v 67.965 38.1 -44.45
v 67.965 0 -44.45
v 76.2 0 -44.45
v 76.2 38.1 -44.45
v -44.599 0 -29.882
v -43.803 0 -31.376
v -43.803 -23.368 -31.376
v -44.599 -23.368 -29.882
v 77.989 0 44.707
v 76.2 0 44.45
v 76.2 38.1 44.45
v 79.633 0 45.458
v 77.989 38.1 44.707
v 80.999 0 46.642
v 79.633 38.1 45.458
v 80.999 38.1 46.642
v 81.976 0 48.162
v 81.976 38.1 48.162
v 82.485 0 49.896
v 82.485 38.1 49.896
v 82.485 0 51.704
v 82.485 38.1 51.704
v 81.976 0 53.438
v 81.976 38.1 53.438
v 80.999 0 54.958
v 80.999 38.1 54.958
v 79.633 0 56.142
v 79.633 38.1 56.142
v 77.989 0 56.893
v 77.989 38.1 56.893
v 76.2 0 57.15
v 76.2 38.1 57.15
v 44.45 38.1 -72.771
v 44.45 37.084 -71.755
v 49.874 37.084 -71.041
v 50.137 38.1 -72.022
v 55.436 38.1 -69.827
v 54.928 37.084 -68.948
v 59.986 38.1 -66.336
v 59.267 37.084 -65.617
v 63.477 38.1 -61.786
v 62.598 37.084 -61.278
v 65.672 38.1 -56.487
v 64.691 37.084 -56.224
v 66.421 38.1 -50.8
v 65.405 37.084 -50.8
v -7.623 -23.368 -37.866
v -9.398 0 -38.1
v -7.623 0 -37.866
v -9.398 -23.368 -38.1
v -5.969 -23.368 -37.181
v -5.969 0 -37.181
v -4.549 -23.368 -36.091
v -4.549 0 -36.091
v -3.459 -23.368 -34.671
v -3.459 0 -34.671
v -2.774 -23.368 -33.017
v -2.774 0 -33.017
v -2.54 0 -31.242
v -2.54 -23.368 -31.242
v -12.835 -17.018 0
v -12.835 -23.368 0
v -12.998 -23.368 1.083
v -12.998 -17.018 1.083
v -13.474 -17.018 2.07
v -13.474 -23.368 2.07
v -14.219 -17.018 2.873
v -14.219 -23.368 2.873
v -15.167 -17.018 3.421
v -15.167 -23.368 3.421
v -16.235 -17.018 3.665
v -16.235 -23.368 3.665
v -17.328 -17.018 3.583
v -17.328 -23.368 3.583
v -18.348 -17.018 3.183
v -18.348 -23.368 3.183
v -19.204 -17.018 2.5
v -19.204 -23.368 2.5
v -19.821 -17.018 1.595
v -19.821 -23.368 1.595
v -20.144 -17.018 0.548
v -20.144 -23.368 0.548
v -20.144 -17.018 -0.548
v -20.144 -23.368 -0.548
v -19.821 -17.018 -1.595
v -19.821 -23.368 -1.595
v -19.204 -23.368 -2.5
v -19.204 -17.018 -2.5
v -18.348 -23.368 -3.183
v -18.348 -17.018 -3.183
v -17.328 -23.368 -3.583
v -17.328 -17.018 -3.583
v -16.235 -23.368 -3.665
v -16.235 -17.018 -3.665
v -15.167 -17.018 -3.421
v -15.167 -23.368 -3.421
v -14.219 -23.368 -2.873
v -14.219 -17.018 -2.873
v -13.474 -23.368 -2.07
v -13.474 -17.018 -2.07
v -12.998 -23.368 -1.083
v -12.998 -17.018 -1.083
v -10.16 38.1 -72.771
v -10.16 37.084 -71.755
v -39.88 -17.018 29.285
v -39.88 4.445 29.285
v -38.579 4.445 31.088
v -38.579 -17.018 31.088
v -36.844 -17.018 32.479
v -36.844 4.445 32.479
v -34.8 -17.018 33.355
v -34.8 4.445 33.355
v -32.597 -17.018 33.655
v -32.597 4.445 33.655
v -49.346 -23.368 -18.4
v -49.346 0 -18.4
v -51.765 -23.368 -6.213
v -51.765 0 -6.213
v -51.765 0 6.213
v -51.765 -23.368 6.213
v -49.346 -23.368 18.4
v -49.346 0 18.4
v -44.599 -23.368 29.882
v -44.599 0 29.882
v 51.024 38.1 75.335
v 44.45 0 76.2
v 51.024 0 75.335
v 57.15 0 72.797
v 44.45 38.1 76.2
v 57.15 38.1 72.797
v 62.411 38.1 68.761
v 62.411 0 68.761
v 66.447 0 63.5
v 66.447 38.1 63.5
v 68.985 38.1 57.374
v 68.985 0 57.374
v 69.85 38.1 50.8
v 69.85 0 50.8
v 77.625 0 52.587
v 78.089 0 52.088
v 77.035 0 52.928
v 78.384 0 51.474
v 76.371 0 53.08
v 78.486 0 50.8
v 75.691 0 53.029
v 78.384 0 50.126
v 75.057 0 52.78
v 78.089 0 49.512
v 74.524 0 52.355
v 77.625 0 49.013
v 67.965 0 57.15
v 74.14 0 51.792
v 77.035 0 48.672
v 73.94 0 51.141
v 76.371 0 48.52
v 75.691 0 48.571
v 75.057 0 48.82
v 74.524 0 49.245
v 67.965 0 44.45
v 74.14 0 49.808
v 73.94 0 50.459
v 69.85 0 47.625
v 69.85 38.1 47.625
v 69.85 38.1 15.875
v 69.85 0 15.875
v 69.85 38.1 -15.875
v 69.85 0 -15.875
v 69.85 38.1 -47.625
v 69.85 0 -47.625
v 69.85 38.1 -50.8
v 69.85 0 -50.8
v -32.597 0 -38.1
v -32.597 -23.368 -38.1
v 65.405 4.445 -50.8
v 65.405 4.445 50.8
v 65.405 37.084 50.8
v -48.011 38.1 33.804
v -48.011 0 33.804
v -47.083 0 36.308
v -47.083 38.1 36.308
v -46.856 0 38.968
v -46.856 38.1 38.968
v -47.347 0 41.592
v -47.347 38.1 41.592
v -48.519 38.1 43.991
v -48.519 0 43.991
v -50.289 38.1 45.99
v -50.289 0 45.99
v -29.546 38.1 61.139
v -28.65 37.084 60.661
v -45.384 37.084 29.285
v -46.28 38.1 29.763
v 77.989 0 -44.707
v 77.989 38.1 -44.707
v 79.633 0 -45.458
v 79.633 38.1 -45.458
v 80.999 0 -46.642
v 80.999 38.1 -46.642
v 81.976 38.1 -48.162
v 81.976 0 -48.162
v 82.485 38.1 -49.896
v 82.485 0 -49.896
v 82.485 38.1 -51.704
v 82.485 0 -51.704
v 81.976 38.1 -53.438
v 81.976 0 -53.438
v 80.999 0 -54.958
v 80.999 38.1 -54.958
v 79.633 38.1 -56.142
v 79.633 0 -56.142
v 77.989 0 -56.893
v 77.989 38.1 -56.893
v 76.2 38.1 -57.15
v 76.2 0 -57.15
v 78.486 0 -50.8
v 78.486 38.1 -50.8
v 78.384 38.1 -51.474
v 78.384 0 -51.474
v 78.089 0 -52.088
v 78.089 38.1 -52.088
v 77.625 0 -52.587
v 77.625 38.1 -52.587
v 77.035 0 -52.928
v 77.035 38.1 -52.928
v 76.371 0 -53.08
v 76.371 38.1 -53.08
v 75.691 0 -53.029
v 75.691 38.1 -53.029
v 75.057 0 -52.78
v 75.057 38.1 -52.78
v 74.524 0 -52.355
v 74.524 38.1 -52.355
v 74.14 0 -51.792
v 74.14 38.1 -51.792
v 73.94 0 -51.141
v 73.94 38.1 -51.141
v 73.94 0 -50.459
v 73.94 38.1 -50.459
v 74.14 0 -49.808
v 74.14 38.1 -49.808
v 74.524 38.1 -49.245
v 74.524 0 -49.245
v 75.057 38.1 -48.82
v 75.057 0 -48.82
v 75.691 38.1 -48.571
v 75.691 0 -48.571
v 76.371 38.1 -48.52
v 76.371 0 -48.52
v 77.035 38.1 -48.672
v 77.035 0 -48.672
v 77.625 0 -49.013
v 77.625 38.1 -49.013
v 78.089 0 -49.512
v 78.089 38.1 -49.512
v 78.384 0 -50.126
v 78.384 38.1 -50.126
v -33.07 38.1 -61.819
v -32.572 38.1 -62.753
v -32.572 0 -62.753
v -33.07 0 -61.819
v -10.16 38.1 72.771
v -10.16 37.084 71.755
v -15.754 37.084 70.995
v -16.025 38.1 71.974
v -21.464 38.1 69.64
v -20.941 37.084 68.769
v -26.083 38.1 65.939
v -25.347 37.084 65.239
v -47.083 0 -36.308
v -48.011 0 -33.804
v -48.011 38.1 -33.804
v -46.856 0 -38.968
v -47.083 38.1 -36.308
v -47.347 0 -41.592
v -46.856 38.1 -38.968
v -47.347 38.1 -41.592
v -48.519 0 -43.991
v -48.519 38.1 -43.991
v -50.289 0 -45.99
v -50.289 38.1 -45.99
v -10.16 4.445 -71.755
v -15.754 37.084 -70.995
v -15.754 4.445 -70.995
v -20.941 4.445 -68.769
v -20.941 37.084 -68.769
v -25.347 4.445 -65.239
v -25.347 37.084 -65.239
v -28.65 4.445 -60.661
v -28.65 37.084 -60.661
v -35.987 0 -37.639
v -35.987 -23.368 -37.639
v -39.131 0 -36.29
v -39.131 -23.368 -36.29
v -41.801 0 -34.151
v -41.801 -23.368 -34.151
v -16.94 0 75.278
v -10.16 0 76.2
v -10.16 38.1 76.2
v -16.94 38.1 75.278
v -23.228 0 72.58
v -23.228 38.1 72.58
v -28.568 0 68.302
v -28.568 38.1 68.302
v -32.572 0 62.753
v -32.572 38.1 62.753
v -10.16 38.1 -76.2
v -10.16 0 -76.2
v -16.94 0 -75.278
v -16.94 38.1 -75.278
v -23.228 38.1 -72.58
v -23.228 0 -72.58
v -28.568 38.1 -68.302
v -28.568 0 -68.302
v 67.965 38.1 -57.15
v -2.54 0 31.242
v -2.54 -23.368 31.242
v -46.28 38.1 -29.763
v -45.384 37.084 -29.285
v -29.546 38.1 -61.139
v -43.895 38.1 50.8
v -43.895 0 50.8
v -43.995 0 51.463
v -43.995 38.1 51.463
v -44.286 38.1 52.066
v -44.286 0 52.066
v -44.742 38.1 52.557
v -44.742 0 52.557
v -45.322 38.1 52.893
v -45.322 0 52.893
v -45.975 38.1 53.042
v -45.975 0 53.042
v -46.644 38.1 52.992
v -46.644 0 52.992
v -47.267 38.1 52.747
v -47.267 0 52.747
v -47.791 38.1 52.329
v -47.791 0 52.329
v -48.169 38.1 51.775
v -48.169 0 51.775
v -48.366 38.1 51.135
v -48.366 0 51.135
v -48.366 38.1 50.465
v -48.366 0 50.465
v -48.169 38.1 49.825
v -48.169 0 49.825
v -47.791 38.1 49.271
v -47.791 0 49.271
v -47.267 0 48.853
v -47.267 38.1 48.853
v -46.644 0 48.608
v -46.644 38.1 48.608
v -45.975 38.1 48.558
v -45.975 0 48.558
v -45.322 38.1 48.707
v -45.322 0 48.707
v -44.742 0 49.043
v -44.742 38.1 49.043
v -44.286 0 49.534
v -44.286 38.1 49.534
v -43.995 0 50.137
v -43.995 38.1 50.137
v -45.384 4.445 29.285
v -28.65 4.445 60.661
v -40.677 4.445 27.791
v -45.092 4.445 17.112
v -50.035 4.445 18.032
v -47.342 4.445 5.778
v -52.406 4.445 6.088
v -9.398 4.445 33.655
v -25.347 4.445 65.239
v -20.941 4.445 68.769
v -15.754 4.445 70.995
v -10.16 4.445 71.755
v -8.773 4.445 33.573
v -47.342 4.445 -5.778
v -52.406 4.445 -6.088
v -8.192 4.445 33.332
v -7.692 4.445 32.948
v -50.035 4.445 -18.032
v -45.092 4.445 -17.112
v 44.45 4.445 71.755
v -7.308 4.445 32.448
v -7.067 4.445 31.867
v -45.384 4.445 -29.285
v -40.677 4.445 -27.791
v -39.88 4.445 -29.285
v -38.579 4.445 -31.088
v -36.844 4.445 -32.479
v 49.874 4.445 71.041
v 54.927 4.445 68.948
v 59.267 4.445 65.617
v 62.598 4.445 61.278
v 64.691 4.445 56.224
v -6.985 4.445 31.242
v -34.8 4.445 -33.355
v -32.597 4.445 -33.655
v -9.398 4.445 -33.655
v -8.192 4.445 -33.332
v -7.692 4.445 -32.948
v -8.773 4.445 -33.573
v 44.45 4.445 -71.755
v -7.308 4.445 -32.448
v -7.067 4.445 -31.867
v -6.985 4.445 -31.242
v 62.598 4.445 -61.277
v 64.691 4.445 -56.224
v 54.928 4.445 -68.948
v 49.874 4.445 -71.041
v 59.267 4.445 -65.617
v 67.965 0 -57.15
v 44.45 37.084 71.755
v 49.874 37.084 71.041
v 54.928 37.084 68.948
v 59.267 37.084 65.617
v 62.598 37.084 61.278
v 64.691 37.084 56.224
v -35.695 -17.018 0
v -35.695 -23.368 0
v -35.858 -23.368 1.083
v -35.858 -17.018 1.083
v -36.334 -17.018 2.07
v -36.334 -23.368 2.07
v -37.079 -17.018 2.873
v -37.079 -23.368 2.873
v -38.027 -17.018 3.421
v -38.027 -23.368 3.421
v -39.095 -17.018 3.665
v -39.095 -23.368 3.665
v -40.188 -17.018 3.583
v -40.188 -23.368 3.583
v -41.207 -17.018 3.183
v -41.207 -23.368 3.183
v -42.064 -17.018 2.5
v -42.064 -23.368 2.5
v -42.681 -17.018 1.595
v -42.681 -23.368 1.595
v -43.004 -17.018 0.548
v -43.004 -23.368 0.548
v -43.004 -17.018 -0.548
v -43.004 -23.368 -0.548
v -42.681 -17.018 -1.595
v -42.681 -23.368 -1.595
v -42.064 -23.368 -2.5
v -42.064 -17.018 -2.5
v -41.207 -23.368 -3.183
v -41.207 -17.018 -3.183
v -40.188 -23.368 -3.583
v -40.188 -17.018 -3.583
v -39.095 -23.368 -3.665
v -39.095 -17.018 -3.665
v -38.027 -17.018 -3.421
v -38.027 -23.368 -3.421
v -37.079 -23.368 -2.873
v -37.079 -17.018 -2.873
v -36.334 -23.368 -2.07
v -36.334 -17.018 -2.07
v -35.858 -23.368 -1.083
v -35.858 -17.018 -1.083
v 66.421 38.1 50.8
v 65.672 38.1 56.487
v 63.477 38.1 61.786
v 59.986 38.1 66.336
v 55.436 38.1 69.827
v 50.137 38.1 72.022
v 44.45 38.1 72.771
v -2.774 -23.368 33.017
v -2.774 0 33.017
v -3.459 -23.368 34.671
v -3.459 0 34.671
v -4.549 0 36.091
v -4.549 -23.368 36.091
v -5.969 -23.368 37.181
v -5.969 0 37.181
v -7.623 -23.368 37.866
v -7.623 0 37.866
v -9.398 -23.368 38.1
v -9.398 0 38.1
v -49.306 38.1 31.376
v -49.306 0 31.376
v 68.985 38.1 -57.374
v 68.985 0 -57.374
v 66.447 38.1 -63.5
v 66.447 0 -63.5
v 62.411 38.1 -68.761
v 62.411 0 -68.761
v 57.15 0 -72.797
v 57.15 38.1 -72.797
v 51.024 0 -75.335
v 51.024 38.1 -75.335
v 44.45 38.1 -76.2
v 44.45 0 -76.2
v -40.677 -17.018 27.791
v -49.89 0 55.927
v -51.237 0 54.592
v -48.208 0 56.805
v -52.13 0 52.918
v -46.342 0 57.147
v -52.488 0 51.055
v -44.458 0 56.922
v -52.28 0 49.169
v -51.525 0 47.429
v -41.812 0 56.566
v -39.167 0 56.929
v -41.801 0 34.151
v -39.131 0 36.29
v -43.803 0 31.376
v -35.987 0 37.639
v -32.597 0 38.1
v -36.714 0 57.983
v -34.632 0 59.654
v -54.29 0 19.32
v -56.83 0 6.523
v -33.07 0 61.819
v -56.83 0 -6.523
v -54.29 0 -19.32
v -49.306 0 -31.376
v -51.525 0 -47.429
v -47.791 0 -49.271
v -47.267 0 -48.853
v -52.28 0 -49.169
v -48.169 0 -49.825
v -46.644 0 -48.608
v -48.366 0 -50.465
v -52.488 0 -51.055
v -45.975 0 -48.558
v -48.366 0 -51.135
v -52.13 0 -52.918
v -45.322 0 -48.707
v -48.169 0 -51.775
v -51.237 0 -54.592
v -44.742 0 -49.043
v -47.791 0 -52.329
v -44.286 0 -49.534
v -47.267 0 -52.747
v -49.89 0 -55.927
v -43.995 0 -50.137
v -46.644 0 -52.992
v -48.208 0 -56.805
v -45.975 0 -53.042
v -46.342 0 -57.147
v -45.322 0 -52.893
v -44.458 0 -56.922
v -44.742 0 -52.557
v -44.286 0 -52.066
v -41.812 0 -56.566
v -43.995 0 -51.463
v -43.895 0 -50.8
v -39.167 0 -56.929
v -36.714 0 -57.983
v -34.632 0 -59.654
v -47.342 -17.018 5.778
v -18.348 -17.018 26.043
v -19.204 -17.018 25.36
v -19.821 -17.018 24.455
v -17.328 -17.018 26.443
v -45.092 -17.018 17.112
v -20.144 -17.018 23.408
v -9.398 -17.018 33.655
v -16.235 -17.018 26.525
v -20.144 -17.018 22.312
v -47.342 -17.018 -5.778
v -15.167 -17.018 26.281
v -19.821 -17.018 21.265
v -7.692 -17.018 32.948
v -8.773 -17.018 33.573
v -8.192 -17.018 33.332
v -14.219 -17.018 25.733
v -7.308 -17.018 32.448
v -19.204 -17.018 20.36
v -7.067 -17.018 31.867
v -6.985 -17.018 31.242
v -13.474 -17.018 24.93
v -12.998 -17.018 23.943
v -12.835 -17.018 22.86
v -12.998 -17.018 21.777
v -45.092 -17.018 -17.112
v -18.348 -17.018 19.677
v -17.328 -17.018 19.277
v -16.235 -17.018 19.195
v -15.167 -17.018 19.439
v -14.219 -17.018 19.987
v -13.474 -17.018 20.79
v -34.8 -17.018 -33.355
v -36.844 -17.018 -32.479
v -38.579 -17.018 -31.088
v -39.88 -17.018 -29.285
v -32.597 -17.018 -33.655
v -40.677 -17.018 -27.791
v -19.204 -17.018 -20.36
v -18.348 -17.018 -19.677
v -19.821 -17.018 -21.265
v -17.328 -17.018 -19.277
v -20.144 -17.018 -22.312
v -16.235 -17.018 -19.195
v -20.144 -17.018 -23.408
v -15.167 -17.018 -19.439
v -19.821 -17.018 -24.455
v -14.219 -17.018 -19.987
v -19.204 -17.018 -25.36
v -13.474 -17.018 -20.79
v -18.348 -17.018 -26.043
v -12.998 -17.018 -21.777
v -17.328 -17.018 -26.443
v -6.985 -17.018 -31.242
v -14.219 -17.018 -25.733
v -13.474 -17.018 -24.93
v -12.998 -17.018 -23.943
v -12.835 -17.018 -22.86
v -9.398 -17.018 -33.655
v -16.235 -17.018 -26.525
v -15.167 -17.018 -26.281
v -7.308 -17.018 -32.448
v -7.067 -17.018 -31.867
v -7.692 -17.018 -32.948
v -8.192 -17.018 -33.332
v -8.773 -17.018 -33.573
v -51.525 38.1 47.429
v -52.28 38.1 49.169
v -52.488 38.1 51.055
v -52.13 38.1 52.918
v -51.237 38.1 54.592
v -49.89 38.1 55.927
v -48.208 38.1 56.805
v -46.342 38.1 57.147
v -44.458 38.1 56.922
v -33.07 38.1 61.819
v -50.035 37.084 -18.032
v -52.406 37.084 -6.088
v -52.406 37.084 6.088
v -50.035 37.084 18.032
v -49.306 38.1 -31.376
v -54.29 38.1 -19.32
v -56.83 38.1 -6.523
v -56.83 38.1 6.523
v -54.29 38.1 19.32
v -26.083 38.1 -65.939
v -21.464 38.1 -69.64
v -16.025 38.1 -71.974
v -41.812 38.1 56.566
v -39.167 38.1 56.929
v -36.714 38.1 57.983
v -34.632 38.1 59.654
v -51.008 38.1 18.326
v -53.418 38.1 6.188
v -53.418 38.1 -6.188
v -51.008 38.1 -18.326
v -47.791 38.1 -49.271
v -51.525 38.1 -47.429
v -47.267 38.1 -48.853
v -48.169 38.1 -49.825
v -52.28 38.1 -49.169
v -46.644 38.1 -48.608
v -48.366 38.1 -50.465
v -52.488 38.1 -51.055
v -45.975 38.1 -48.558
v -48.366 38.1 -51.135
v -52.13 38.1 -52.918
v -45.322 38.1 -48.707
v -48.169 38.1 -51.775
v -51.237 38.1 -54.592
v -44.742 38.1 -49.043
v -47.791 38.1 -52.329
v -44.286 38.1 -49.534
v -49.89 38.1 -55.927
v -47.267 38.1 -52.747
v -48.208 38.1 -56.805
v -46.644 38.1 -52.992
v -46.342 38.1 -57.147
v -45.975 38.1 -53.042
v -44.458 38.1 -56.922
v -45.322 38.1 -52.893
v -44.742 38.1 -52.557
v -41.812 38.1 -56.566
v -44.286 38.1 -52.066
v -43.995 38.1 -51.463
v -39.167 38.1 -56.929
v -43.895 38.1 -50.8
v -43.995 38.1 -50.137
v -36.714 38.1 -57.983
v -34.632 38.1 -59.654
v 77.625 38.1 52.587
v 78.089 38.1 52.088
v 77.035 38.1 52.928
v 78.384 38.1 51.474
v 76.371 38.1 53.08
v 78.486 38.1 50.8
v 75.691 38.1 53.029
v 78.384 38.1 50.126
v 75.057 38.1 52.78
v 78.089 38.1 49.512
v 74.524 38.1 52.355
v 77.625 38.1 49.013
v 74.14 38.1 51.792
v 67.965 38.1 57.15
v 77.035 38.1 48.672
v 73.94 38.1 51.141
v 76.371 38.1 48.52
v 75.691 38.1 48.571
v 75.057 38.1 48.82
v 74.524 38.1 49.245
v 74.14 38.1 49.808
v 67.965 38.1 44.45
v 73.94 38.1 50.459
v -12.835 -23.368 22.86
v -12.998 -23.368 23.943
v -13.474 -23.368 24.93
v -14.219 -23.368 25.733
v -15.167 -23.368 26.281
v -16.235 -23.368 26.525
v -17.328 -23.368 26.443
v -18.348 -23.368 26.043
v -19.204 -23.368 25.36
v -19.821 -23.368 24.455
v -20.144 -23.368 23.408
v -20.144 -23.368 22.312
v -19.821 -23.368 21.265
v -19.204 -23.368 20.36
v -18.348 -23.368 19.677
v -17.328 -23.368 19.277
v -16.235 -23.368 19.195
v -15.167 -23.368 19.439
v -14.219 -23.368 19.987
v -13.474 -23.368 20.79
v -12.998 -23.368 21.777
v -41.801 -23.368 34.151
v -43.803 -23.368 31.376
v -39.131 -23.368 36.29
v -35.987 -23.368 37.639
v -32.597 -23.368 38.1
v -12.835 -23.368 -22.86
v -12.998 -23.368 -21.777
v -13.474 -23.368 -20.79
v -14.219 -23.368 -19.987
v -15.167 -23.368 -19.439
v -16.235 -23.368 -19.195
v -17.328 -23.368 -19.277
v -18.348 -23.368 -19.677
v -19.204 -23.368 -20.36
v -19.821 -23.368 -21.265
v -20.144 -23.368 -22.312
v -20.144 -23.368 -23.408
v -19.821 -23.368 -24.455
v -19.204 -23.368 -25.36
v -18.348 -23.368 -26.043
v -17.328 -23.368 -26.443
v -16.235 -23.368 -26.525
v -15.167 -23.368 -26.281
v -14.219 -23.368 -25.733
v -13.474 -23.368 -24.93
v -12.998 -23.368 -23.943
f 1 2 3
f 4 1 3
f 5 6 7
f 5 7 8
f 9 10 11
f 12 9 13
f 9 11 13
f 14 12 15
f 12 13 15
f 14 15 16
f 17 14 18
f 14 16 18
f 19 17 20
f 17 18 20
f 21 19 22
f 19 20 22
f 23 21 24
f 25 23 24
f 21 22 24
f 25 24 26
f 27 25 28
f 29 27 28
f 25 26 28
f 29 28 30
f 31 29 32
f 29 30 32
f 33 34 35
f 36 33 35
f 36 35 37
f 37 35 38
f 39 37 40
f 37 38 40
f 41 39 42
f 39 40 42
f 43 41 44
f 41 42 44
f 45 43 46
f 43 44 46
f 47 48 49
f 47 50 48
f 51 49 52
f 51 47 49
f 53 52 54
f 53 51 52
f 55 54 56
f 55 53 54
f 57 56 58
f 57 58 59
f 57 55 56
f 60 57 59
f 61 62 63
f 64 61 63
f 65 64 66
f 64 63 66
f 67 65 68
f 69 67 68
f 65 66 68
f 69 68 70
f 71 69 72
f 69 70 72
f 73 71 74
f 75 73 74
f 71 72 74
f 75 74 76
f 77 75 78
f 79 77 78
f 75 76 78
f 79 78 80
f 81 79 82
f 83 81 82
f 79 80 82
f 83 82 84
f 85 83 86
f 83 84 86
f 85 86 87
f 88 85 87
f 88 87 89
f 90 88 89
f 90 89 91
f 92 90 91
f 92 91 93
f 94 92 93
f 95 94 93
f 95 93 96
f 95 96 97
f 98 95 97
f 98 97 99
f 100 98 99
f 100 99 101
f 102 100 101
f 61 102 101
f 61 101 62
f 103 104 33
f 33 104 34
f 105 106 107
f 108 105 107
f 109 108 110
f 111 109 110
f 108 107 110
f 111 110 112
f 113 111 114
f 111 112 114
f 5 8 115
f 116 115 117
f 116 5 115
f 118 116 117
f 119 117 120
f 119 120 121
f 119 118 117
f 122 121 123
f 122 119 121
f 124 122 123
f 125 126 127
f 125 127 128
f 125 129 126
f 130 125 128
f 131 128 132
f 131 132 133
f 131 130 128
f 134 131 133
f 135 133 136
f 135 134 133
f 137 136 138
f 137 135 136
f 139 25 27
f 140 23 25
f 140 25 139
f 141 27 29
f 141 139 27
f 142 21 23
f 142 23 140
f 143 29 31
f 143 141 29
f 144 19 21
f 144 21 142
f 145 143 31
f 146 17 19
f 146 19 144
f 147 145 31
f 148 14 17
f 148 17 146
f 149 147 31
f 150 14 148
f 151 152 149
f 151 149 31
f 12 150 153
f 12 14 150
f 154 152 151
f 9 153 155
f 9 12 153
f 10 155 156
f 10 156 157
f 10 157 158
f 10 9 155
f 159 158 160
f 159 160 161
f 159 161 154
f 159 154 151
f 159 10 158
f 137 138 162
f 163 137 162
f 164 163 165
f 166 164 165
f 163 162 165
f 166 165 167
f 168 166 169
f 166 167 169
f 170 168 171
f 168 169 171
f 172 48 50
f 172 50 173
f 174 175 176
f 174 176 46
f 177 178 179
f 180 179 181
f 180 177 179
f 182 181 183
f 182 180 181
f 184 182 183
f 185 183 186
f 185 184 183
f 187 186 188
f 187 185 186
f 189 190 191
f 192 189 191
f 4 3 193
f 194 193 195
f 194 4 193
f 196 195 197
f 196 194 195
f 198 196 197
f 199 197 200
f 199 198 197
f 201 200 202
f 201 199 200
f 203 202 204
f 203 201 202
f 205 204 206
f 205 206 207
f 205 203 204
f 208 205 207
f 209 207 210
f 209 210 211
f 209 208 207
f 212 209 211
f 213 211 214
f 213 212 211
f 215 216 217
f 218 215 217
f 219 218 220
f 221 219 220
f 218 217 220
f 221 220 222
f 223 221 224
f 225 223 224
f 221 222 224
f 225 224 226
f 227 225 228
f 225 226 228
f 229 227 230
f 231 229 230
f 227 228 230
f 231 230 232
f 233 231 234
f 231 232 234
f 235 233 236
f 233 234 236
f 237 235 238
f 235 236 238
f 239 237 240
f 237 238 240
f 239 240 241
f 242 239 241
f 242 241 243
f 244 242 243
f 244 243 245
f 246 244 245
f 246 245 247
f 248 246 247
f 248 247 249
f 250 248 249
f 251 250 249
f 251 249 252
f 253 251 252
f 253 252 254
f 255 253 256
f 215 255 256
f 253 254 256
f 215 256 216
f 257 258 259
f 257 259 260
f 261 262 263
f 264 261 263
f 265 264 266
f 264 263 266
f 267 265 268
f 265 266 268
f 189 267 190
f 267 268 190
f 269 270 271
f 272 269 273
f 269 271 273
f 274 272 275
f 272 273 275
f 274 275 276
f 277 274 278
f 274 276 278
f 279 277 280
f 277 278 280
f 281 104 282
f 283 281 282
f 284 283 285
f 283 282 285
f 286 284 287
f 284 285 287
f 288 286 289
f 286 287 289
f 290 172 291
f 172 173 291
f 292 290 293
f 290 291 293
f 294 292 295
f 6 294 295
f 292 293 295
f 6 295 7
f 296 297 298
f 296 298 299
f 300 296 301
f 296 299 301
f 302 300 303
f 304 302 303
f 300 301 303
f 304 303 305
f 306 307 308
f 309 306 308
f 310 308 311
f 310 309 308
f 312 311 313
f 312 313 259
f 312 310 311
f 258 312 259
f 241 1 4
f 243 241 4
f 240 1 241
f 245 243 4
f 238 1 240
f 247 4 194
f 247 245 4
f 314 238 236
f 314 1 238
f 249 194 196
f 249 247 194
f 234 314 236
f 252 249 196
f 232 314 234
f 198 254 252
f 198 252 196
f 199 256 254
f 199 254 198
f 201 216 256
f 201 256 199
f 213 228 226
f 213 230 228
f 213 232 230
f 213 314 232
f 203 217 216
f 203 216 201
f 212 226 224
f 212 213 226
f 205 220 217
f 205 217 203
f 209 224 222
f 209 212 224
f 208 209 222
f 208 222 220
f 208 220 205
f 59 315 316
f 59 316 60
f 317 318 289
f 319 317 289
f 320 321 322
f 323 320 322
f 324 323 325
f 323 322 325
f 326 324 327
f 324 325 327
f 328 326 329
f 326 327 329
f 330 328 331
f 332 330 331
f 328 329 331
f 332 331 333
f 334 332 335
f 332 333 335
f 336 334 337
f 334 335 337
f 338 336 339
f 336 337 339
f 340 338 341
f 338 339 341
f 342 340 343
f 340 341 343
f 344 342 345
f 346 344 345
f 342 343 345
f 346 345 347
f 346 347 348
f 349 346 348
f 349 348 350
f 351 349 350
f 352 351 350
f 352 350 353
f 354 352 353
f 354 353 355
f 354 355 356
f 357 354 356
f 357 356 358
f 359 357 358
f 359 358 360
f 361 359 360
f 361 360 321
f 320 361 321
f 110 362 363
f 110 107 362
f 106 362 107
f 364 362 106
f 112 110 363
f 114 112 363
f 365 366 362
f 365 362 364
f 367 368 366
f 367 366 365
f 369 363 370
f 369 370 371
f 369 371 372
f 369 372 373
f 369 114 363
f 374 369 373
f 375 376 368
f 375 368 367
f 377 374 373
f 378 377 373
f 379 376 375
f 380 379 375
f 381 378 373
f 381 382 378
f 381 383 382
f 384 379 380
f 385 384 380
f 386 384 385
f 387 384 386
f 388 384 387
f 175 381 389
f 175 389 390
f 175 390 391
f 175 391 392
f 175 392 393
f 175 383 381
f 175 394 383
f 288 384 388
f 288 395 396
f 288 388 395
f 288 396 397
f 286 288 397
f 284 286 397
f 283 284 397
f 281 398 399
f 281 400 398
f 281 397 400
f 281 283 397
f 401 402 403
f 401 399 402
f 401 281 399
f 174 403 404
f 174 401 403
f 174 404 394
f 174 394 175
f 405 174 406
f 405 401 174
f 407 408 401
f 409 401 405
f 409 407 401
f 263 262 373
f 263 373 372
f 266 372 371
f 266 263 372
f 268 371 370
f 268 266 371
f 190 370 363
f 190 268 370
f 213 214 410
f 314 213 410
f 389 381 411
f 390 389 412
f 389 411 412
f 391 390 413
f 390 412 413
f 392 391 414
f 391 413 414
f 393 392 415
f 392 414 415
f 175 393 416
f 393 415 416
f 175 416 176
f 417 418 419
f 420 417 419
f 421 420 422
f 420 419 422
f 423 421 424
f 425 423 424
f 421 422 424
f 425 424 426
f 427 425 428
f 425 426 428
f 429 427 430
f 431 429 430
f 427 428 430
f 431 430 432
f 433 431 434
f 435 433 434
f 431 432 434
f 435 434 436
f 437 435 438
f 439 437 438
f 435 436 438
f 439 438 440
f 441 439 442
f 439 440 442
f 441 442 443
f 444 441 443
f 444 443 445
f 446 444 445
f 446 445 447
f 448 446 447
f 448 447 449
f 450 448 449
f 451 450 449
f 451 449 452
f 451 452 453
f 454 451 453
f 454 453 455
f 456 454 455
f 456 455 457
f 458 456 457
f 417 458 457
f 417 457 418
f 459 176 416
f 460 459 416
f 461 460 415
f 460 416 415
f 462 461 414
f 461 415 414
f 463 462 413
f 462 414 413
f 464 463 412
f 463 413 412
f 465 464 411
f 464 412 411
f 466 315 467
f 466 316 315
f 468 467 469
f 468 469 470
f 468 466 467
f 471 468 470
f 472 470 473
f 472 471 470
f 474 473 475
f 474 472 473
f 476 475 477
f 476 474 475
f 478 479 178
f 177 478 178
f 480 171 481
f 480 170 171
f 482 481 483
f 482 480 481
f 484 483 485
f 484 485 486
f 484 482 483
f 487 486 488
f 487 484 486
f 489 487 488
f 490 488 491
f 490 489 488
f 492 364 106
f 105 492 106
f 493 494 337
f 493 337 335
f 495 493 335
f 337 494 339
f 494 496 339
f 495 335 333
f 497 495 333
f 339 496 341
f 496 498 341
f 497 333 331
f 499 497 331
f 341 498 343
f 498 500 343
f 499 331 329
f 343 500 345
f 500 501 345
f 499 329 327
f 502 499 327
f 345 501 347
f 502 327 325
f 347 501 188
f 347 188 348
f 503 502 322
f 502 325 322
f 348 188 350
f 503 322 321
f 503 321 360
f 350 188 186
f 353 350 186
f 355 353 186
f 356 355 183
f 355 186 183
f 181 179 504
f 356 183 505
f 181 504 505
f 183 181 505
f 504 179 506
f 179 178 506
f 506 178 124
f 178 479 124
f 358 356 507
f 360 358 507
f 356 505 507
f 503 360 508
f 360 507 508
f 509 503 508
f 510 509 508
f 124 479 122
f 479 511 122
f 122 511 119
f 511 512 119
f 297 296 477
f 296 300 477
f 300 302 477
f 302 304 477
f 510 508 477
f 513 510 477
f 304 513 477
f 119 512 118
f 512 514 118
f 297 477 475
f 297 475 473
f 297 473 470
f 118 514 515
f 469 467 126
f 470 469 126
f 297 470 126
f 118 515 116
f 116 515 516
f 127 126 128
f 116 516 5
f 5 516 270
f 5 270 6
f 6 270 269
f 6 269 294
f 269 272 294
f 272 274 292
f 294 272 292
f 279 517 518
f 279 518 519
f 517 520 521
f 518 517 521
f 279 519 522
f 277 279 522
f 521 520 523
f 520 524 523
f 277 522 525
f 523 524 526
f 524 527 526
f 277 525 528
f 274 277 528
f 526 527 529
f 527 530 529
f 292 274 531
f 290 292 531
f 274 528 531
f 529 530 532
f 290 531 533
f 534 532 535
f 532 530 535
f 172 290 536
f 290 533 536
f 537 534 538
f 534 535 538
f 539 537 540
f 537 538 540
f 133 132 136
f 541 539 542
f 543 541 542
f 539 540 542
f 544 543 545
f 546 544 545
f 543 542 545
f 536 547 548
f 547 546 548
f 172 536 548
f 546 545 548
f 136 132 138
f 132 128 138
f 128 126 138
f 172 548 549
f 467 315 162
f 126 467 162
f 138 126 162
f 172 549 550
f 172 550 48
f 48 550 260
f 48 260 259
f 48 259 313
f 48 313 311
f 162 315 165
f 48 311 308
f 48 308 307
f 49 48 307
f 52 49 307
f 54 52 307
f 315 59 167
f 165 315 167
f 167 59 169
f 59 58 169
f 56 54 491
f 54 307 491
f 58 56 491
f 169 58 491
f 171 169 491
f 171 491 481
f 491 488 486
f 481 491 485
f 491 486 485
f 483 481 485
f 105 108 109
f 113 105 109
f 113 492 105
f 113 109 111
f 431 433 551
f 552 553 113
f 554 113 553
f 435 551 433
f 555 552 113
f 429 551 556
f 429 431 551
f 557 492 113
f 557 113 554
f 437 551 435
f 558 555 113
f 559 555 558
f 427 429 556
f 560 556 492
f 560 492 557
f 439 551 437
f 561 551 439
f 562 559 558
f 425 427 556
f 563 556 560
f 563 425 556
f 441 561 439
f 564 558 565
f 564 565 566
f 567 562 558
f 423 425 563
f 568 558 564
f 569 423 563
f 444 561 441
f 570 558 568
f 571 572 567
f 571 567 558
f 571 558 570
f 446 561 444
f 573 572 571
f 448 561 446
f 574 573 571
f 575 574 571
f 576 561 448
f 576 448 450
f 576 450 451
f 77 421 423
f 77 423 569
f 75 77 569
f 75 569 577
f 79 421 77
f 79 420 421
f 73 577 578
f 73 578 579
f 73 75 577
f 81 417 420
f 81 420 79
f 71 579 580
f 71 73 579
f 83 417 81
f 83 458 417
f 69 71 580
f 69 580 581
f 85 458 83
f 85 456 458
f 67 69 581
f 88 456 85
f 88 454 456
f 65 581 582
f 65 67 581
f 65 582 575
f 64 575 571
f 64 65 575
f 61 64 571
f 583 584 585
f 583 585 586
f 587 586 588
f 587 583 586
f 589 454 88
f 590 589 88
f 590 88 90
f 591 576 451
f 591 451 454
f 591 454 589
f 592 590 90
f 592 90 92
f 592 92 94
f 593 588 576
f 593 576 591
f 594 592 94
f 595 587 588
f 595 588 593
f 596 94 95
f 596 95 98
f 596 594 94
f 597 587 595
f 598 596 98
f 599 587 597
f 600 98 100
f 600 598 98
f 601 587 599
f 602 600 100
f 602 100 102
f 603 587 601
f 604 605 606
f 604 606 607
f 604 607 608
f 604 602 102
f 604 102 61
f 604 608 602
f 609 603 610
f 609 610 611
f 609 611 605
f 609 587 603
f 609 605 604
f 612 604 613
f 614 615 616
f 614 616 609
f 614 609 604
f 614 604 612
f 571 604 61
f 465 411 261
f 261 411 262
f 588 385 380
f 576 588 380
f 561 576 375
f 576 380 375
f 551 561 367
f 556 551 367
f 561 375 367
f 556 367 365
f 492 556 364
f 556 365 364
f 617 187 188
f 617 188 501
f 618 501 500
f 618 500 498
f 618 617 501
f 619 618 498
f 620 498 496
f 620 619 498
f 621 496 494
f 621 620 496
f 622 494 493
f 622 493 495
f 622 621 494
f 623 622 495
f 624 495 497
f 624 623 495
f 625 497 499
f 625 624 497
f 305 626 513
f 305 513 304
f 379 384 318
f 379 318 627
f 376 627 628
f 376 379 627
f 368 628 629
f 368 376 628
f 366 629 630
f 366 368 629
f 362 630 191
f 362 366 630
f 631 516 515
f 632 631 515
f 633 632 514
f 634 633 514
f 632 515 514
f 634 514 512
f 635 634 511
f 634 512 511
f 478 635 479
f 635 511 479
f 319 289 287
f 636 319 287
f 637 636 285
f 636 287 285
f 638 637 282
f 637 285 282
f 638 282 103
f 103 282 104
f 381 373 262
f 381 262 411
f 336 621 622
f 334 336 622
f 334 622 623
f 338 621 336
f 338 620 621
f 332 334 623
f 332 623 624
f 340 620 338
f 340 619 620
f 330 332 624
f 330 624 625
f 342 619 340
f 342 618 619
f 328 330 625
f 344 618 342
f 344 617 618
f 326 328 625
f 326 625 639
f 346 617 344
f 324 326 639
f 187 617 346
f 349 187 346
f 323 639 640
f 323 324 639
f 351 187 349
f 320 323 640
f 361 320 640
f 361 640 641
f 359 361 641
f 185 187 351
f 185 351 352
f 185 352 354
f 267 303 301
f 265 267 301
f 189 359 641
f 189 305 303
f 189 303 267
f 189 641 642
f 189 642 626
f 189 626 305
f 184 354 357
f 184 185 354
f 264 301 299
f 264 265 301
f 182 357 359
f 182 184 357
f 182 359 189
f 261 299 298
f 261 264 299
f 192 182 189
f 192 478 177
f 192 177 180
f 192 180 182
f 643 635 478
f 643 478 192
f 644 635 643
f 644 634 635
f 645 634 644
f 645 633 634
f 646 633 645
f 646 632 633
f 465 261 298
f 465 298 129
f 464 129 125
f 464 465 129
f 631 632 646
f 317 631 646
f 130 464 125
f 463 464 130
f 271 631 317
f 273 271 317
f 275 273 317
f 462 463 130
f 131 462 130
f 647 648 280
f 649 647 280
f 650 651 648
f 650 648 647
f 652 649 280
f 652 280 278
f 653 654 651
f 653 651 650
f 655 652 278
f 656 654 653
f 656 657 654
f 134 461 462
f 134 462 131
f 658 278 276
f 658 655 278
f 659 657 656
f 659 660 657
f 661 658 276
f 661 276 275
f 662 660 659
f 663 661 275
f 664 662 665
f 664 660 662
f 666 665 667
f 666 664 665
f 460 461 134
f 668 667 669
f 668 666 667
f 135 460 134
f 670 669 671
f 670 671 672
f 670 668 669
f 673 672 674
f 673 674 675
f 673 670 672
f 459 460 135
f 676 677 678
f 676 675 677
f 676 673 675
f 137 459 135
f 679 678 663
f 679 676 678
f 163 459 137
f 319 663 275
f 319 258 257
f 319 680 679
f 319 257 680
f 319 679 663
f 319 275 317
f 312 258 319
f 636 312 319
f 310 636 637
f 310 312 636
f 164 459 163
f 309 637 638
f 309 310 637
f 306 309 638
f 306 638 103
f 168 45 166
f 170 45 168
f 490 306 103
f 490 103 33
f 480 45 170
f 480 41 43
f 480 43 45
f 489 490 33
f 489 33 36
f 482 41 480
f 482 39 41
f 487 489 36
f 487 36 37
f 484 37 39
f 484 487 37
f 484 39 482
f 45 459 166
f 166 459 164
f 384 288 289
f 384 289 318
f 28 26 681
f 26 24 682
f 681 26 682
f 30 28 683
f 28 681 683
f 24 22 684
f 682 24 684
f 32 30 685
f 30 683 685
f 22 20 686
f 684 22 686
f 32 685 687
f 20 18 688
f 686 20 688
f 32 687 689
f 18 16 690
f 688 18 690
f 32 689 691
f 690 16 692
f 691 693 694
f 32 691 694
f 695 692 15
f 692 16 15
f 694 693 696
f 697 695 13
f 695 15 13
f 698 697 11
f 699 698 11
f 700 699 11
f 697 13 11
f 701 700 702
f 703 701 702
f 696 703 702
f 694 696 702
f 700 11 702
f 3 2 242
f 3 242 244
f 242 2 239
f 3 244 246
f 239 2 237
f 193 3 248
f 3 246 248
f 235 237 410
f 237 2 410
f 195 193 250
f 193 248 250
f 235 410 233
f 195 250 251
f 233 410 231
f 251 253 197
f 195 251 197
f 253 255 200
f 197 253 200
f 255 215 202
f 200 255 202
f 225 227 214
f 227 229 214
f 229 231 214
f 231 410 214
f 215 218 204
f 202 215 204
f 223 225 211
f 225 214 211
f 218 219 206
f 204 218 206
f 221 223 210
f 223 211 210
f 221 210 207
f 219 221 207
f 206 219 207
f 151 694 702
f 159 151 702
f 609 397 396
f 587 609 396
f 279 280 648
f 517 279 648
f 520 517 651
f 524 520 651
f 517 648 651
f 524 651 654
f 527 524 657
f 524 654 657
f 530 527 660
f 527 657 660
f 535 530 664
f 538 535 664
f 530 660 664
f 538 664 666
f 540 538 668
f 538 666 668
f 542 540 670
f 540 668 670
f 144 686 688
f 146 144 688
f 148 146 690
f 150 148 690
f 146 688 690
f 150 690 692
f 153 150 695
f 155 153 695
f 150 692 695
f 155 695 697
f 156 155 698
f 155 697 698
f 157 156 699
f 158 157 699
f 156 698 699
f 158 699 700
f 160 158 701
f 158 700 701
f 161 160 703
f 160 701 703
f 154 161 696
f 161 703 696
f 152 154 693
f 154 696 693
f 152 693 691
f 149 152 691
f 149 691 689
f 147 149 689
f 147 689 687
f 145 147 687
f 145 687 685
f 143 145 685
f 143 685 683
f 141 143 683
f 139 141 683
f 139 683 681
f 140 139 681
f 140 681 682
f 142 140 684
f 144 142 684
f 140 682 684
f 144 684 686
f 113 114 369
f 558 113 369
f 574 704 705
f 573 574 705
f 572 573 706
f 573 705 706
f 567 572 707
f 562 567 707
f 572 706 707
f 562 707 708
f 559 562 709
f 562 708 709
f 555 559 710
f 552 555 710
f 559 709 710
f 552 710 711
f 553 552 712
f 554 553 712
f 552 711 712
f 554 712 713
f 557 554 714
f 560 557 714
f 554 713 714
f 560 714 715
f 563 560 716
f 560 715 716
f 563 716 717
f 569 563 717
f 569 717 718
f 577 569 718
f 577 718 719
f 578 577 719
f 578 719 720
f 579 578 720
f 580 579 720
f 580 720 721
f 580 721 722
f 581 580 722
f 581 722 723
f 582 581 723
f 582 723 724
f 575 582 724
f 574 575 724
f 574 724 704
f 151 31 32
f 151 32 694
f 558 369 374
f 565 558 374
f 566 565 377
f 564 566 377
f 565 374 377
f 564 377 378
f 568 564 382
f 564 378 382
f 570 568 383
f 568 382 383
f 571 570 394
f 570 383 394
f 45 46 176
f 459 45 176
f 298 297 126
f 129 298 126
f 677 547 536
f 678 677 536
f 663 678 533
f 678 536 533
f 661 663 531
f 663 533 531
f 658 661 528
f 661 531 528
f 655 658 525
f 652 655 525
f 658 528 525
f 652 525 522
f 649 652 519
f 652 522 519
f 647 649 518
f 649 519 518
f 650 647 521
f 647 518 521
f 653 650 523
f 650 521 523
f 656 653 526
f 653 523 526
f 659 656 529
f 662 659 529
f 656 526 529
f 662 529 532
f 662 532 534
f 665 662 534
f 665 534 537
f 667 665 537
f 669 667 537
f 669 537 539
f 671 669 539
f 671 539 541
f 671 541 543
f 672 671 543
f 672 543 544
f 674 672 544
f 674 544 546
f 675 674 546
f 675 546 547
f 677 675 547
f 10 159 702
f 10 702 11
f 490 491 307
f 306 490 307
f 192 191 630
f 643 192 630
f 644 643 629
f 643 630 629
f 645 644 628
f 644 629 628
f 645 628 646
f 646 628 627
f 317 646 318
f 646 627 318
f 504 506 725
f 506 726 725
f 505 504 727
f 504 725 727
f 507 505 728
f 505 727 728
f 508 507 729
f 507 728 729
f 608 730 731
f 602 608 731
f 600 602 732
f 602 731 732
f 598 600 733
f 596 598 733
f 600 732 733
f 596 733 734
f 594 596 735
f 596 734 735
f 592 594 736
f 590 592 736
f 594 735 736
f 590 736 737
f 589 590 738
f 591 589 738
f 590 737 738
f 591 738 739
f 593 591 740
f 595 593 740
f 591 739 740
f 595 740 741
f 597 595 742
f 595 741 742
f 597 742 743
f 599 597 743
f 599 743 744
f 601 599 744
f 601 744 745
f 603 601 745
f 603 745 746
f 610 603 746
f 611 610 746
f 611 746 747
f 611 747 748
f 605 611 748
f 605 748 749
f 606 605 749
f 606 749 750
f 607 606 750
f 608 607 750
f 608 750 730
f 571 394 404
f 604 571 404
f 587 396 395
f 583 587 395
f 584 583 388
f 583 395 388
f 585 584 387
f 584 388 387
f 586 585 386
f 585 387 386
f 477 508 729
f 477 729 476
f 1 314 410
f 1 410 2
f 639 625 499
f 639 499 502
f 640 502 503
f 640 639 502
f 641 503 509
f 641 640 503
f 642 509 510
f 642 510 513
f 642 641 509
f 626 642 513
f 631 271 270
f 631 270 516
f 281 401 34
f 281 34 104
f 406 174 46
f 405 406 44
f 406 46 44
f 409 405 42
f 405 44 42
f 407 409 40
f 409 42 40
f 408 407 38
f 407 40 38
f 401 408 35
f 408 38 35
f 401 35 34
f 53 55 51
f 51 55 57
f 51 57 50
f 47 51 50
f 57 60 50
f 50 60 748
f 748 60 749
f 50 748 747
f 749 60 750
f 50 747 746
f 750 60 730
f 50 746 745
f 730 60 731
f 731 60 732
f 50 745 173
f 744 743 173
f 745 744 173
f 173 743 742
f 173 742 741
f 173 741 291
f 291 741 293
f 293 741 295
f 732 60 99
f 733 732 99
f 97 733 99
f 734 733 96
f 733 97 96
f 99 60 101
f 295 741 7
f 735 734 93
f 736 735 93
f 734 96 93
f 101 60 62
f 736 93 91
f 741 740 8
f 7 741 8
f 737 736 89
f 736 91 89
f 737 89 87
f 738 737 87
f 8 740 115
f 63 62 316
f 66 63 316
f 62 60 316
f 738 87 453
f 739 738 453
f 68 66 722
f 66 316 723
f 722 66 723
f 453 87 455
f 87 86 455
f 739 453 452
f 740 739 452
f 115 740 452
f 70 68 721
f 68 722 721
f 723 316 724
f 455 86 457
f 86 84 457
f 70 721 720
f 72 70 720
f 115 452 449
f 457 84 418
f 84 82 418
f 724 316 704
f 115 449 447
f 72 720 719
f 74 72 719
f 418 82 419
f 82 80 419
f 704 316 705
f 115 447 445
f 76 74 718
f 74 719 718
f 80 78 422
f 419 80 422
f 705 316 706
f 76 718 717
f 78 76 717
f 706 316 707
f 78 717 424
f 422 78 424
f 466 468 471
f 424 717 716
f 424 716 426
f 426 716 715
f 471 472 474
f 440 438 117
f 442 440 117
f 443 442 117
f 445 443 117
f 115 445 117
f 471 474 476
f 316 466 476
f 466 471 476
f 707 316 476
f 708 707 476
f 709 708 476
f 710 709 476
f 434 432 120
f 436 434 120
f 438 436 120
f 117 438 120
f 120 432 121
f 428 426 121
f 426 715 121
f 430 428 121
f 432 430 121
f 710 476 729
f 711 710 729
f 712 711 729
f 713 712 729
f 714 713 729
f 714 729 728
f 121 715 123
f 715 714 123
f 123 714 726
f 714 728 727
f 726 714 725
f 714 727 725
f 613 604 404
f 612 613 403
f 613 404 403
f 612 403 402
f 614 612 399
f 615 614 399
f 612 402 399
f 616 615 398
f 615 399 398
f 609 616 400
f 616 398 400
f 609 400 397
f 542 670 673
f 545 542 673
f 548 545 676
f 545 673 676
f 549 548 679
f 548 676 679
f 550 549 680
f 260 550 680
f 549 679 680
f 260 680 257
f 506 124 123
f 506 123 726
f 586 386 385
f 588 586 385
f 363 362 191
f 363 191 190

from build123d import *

# Parameters (mm, degrees)
BOSS_EXTRUDE1_DEPTH   = 38.1
FILLET1_R             = 25.4
SHELL1_T              = -4.445
NUB_DEPTH             = 23.368
FILLET2_R             = 12.7
FILLET3_R             = 6.858
CUT_EXTRUDE1_DEPTH    = 21.463
CHAMFER1_SIZE         = 1.016
BOSS_EXTRUDE2_DEPTH   = 38.1
F_8_CLEARANCE_HOLE1_D = 4.4958
SKETCH14_R            = 3.675
CUT_EXTRUDE2_DEPTH    = 62.468
SKETCH18_W            = 17.900644311
SKETCH18_H            = 98.827895465
CUT_EXTRUDE5_DEPTH    = 62.468
SKETCH19_R            = 2.286
BOSS_EXTRUDE4_DEPTH   = 38.1
BOSS_EXTRUDE4_2_DEPTH = 38.1


with BuildPart() as part:
    # Sketch1 → Boss-Extrude1 (new body)
    with BuildSketch(Plane(origin=(0, 0, 0), x_dir=(1, 0, 0), z_dir=(0, 1, 0))):
        with BuildLine():
            Line((-25.4, -76.2), (69.85, -76.2))
            Line((69.85, -76.2), (69.85, 76.2))
            Line((69.85, 76.2), (-25.4, 76.2))
            Line((-25.4, 76.2), (-49.305882353, 31.376470588))
            ThreePointArc((-49.305882353, 31.376470588), (-57.15, 0), (-49.305882353, -31.376470588))
            Line((-49.305882353, -31.376470588), (-25.4, -76.2))
        make_face()
    extrude(amount=BOSS_EXTRUDE1_DEPTH)

    # Fillet1
    fillet1_edges = [part.edges().sort_by_distance(p)[0] for p in [
        (69.85, 19.05, 76.2),
        (-25.4, 19.05, 76.2),
        (-25.4, 19.05, -76.2),
        (69.85, 19.05, -76.2),
    ]]
    fillet(fillet1_edges, radius=FILLET1_R)

    # Shell1
    shell1_openings = [part.faces().sort_by_distance(p)[0] for p in [
        (4.347699305, 38.1, 0),
    ]]
    offset(amount=SHELL1_T, openings=shell1_openings, kind=Kind.INTERSECTION)

    # Sketch13 → nub (add)
    with BuildSketch(Plane.XZ):
        with BuildLine():
            Line((-2.54, 38.1), (-2.54, -38.1))
            Line((-2.54, -38.1), (-40.216666667, -38.1))
            Line((-40.216666667, -38.1), (-44.599411765, -29.882352941))
            ThreePointArc((-44.599411765, -29.882352941), (-52.07, 0), (-44.599411765, 29.882352941))
            Line((-44.599411765, 29.882352941), (-40.216666667, 38.1))
            Line((-40.216666667, 38.1), (-2.54, 38.1))
        make_face()
    extrude(amount=NUB_DEPTH)

    # Fillet2
    fillet2_edges = [part.edges().sort_by_distance(p)[0] for p in [
        (-40.216666667, -11.684, 38.1),
        (-40.216666667, -11.684, -38.1),
    ]]
    fillet(fillet2_edges, radius=FILLET2_R)

    # Fillet3
    fillet3_edges = [part.edges().sort_by_distance(p)[0] for p in [
        (-2.54, -11.684, 38.1),
        (-2.54, -11.684, -38.1),
    ]]
    fillet(fillet3_edges, radius=FILLET3_R)

    # Sketch8 → Cut-Extrude1 (cut)
    with BuildSketch(Plane(origin=(0, 4.445, 0), x_dir=(1, 0, 0), z_dir=(0, 1, 0))):
        with BuildLine():
            Line((-32.596666667, -33.655), (-9.398, -33.655))
            ThreePointArc((-9.398, -33.655), (-7.691751337, -32.948248663), (-6.985, -31.242))
            Line((-6.985, -31.242), (-6.985, 31.242))
            ThreePointArc((-6.985, 31.242), (-7.691751337, 32.948248663), (-9.398, 33.655))
            Line((-9.398, 33.655), (-32.596666667, 33.655))
            ThreePointArc((-32.596666667, 33.655), (-36.843829128, 32.478604102), (-39.880490196, 29.284705882))
            Line((-39.880490196, 29.284705882), (-40.677352941, 27.790588235))
            ThreePointArc((-40.677352941, 27.790588235), (-47.625, 0), (-40.677352941, -27.790588235))
            Line((-40.677352941, -27.790588235), (-39.880490196, -29.284705882))
            ThreePointArc((-39.880490196, -29.284705882), (-36.843829128, -32.478604102), (-32.596666667, -33.655))
        make_face()
    extrude(amount=-CUT_EXTRUDE1_DEPTH, mode=Mode.SUBTRACT)

    # Chamfer1
    chamfer1_edges = [part.edges().sort_by_distance(p)[0] for p in [
        (-37.016764706, 38.1, 44.972941176),
        (-20.941258555, 38.1, 68.768764258),
        (17.145, 38.1, 71.755),
        (59.2674226, 38.1, 65.6174226),
        (65.405, 38.1, 0),
        (59.2674226, 38.1, -65.6174226),
        (17.145, 38.1, -71.755),
        (-20.941258555, 38.1, -68.768764258),
        (-37.016764706, 38.1, -44.972941176),
        (-52.705, 38.1, 0),
    ]]
    chamfer(chamfer1_edges, length=CHAMFER1_SIZE)

    # Sketch10 → Boss-Extrude2 (add)
    with BuildSketch(Plane(origin=(0, 38.1, 0), x_dir=(1, 0, 0), z_dir=(0, 1, 0))):
        with BuildLine():
            Line((69.85, 47.625), (69.85, 15.875))
            ThreePointArc((69.85, 15.875), (72.024192281, 22.073146175), (77.593902439, 25.554878049))
            ThreePointArc((77.593902439, 25.554878049), (82.55, 31.75), (77.593902439, 37.945121951))
            ThreePointArc((77.593902439, 37.945121951), (72.024192281, 41.426853825), (69.85, 47.625))
        make_face()
        with BuildLine():
            Line((69.85, -47.625), (69.85, -15.875))
            ThreePointArc((69.85, -15.875), (72.024192281, -22.073146175), (77.593902439, -25.554878049))
            ThreePointArc((77.593902439, -25.554878049), (82.55, -31.75), (77.593902439, -37.945121951))
            ThreePointArc((77.593902439, -37.945121951), (72.024192281, -41.426853825), (69.85, -47.625))
        make_face()
        with BuildLine():
            Line((-33.069803922, 61.819117647), (-48.010980392, 33.804411765))
            ThreePointArc((-48.010980392, 33.804411765), (-47.012610676, 40.296513581), (-50.288598757, 45.989670014))
            ThreePointArc((-50.288598757, 45.989670014), (-51.74627451, 53.788235294), (-44.457895744, 56.922238164))
            ThreePointArc((-44.457895744, 56.922238164), (-37.904983546, 57.373314449), (-33.069803922, 61.819117647))
        make_face()
        with BuildLine():
            Line((-33.069803922, -61.819117647), (-48.010980392, -33.804411765))
            ThreePointArc((-48.010980392, -33.804411765), (-47.012610676, -40.296513581), (-50.288598757, -45.989670014))
            ThreePointArc((-50.288598757, -45.989670014), (-51.74627451, -53.788235294), (-44.457895744, -56.922238164))
            ThreePointArc((-44.457895744, -56.922238164), (-37.904983546, -57.373314449), (-33.069803922, -61.819117647))
        make_face()
    extrude(amount=-BOSS_EXTRUDE2_DEPTH)

    # #8 Clearance Hole1 (through all)
    with Locations(Plane(origin=(0, 38.1, 0), x_dir=(-1, 0, 0), z_dir=(0, 1, 0))):
        with Locations((46.143333333, -50.8), (46.143333333, 50.8), (-76.2, 31.75), (-76.2, -31.75)):
            Hole(F_8_CLEARANCE_HOLE1_D / 2)

    # Sketch14 → Cut-Extrude2 (cut, through all)
    with BuildSketch(Plane.XZ.offset(23.368)):
        with Locations((-16.51, 22.86)):
            Circle(SKETCH14_R)
        with Locations((-16.51, 0)):
            Circle(SKETCH14_R)
        with Locations((-16.51, -22.86)):
            Circle(SKETCH14_R)
        with Locations((-39.37, 0)):
            Circle(SKETCH14_R)
    extrude(amount=-CUT_EXTRUDE2_DEPTH, mode=Mode.SUBTRACT)

    # Sketch18 → Cut-Extrude5 (cut, through all)
    with BuildSketch(Plane(origin=(0, 38.1, 0), x_dir=(1, 0, 0), z_dir=(0, 1, 0))):
        with Locations((78.800322155, -1.788947733)):
            Rectangle(SKETCH18_W, SKETCH18_H)
    extrude(amount=-CUT_EXTRUDE5_DEPTH, mode=Mode.SUBTRACT)


with BuildPart() as body_2:
    # Sketch19 → Boss-Extrude4 (new body)
    with BuildSketch(Plane(origin=(0, 38.1, 0), x_dir=(1, 0, 0), z_dir=(0, 1, 0))):
        with BuildLine():
            Line((76.2, 57.15), (67.964574811, 57.15))
            Line((67.964574811, 57.15), (67.964574811, 44.45))
            Line((67.964574811, 44.45), (76.2, 44.45))
            ThreePointArc((76.2, 44.45), (82.55, 50.8), (76.2, 57.15))
        make_face()
        with Locations((76.2, 50.8)):
            Circle(SKETCH19_R, mode=Mode.SUBTRACT)
    extrude(amount=-BOSS_EXTRUDE4_DEPTH)


with BuildPart() as body_3:
    # Sketch19 → Boss-Extrude4 2 (new body)
    with BuildSketch(Plane(origin=(0, 38.1, 0), x_dir=(1, 0, 0), z_dir=(0, 1, 0))):
        with BuildLine():
            Line((67.964574811, -44.45), (76.2, -44.45))
            ThreePointArc((76.2, -44.45), (82.55, -50.8), (76.2, -57.15))
            Line((76.2, -57.15), (67.964574811, -57.15))
            Line((67.964574811, -57.15), (67.964574811, -44.45))
        make_face()
        with Locations((76.2, -50.8)):
            Circle(SKETCH19_R, mode=Mode.SUBTRACT)
    extrude(amount=-BOSS_EXTRUDE4_2_DEPTH)


solid = Compound([part.part, body_2.part, body_3.part])
